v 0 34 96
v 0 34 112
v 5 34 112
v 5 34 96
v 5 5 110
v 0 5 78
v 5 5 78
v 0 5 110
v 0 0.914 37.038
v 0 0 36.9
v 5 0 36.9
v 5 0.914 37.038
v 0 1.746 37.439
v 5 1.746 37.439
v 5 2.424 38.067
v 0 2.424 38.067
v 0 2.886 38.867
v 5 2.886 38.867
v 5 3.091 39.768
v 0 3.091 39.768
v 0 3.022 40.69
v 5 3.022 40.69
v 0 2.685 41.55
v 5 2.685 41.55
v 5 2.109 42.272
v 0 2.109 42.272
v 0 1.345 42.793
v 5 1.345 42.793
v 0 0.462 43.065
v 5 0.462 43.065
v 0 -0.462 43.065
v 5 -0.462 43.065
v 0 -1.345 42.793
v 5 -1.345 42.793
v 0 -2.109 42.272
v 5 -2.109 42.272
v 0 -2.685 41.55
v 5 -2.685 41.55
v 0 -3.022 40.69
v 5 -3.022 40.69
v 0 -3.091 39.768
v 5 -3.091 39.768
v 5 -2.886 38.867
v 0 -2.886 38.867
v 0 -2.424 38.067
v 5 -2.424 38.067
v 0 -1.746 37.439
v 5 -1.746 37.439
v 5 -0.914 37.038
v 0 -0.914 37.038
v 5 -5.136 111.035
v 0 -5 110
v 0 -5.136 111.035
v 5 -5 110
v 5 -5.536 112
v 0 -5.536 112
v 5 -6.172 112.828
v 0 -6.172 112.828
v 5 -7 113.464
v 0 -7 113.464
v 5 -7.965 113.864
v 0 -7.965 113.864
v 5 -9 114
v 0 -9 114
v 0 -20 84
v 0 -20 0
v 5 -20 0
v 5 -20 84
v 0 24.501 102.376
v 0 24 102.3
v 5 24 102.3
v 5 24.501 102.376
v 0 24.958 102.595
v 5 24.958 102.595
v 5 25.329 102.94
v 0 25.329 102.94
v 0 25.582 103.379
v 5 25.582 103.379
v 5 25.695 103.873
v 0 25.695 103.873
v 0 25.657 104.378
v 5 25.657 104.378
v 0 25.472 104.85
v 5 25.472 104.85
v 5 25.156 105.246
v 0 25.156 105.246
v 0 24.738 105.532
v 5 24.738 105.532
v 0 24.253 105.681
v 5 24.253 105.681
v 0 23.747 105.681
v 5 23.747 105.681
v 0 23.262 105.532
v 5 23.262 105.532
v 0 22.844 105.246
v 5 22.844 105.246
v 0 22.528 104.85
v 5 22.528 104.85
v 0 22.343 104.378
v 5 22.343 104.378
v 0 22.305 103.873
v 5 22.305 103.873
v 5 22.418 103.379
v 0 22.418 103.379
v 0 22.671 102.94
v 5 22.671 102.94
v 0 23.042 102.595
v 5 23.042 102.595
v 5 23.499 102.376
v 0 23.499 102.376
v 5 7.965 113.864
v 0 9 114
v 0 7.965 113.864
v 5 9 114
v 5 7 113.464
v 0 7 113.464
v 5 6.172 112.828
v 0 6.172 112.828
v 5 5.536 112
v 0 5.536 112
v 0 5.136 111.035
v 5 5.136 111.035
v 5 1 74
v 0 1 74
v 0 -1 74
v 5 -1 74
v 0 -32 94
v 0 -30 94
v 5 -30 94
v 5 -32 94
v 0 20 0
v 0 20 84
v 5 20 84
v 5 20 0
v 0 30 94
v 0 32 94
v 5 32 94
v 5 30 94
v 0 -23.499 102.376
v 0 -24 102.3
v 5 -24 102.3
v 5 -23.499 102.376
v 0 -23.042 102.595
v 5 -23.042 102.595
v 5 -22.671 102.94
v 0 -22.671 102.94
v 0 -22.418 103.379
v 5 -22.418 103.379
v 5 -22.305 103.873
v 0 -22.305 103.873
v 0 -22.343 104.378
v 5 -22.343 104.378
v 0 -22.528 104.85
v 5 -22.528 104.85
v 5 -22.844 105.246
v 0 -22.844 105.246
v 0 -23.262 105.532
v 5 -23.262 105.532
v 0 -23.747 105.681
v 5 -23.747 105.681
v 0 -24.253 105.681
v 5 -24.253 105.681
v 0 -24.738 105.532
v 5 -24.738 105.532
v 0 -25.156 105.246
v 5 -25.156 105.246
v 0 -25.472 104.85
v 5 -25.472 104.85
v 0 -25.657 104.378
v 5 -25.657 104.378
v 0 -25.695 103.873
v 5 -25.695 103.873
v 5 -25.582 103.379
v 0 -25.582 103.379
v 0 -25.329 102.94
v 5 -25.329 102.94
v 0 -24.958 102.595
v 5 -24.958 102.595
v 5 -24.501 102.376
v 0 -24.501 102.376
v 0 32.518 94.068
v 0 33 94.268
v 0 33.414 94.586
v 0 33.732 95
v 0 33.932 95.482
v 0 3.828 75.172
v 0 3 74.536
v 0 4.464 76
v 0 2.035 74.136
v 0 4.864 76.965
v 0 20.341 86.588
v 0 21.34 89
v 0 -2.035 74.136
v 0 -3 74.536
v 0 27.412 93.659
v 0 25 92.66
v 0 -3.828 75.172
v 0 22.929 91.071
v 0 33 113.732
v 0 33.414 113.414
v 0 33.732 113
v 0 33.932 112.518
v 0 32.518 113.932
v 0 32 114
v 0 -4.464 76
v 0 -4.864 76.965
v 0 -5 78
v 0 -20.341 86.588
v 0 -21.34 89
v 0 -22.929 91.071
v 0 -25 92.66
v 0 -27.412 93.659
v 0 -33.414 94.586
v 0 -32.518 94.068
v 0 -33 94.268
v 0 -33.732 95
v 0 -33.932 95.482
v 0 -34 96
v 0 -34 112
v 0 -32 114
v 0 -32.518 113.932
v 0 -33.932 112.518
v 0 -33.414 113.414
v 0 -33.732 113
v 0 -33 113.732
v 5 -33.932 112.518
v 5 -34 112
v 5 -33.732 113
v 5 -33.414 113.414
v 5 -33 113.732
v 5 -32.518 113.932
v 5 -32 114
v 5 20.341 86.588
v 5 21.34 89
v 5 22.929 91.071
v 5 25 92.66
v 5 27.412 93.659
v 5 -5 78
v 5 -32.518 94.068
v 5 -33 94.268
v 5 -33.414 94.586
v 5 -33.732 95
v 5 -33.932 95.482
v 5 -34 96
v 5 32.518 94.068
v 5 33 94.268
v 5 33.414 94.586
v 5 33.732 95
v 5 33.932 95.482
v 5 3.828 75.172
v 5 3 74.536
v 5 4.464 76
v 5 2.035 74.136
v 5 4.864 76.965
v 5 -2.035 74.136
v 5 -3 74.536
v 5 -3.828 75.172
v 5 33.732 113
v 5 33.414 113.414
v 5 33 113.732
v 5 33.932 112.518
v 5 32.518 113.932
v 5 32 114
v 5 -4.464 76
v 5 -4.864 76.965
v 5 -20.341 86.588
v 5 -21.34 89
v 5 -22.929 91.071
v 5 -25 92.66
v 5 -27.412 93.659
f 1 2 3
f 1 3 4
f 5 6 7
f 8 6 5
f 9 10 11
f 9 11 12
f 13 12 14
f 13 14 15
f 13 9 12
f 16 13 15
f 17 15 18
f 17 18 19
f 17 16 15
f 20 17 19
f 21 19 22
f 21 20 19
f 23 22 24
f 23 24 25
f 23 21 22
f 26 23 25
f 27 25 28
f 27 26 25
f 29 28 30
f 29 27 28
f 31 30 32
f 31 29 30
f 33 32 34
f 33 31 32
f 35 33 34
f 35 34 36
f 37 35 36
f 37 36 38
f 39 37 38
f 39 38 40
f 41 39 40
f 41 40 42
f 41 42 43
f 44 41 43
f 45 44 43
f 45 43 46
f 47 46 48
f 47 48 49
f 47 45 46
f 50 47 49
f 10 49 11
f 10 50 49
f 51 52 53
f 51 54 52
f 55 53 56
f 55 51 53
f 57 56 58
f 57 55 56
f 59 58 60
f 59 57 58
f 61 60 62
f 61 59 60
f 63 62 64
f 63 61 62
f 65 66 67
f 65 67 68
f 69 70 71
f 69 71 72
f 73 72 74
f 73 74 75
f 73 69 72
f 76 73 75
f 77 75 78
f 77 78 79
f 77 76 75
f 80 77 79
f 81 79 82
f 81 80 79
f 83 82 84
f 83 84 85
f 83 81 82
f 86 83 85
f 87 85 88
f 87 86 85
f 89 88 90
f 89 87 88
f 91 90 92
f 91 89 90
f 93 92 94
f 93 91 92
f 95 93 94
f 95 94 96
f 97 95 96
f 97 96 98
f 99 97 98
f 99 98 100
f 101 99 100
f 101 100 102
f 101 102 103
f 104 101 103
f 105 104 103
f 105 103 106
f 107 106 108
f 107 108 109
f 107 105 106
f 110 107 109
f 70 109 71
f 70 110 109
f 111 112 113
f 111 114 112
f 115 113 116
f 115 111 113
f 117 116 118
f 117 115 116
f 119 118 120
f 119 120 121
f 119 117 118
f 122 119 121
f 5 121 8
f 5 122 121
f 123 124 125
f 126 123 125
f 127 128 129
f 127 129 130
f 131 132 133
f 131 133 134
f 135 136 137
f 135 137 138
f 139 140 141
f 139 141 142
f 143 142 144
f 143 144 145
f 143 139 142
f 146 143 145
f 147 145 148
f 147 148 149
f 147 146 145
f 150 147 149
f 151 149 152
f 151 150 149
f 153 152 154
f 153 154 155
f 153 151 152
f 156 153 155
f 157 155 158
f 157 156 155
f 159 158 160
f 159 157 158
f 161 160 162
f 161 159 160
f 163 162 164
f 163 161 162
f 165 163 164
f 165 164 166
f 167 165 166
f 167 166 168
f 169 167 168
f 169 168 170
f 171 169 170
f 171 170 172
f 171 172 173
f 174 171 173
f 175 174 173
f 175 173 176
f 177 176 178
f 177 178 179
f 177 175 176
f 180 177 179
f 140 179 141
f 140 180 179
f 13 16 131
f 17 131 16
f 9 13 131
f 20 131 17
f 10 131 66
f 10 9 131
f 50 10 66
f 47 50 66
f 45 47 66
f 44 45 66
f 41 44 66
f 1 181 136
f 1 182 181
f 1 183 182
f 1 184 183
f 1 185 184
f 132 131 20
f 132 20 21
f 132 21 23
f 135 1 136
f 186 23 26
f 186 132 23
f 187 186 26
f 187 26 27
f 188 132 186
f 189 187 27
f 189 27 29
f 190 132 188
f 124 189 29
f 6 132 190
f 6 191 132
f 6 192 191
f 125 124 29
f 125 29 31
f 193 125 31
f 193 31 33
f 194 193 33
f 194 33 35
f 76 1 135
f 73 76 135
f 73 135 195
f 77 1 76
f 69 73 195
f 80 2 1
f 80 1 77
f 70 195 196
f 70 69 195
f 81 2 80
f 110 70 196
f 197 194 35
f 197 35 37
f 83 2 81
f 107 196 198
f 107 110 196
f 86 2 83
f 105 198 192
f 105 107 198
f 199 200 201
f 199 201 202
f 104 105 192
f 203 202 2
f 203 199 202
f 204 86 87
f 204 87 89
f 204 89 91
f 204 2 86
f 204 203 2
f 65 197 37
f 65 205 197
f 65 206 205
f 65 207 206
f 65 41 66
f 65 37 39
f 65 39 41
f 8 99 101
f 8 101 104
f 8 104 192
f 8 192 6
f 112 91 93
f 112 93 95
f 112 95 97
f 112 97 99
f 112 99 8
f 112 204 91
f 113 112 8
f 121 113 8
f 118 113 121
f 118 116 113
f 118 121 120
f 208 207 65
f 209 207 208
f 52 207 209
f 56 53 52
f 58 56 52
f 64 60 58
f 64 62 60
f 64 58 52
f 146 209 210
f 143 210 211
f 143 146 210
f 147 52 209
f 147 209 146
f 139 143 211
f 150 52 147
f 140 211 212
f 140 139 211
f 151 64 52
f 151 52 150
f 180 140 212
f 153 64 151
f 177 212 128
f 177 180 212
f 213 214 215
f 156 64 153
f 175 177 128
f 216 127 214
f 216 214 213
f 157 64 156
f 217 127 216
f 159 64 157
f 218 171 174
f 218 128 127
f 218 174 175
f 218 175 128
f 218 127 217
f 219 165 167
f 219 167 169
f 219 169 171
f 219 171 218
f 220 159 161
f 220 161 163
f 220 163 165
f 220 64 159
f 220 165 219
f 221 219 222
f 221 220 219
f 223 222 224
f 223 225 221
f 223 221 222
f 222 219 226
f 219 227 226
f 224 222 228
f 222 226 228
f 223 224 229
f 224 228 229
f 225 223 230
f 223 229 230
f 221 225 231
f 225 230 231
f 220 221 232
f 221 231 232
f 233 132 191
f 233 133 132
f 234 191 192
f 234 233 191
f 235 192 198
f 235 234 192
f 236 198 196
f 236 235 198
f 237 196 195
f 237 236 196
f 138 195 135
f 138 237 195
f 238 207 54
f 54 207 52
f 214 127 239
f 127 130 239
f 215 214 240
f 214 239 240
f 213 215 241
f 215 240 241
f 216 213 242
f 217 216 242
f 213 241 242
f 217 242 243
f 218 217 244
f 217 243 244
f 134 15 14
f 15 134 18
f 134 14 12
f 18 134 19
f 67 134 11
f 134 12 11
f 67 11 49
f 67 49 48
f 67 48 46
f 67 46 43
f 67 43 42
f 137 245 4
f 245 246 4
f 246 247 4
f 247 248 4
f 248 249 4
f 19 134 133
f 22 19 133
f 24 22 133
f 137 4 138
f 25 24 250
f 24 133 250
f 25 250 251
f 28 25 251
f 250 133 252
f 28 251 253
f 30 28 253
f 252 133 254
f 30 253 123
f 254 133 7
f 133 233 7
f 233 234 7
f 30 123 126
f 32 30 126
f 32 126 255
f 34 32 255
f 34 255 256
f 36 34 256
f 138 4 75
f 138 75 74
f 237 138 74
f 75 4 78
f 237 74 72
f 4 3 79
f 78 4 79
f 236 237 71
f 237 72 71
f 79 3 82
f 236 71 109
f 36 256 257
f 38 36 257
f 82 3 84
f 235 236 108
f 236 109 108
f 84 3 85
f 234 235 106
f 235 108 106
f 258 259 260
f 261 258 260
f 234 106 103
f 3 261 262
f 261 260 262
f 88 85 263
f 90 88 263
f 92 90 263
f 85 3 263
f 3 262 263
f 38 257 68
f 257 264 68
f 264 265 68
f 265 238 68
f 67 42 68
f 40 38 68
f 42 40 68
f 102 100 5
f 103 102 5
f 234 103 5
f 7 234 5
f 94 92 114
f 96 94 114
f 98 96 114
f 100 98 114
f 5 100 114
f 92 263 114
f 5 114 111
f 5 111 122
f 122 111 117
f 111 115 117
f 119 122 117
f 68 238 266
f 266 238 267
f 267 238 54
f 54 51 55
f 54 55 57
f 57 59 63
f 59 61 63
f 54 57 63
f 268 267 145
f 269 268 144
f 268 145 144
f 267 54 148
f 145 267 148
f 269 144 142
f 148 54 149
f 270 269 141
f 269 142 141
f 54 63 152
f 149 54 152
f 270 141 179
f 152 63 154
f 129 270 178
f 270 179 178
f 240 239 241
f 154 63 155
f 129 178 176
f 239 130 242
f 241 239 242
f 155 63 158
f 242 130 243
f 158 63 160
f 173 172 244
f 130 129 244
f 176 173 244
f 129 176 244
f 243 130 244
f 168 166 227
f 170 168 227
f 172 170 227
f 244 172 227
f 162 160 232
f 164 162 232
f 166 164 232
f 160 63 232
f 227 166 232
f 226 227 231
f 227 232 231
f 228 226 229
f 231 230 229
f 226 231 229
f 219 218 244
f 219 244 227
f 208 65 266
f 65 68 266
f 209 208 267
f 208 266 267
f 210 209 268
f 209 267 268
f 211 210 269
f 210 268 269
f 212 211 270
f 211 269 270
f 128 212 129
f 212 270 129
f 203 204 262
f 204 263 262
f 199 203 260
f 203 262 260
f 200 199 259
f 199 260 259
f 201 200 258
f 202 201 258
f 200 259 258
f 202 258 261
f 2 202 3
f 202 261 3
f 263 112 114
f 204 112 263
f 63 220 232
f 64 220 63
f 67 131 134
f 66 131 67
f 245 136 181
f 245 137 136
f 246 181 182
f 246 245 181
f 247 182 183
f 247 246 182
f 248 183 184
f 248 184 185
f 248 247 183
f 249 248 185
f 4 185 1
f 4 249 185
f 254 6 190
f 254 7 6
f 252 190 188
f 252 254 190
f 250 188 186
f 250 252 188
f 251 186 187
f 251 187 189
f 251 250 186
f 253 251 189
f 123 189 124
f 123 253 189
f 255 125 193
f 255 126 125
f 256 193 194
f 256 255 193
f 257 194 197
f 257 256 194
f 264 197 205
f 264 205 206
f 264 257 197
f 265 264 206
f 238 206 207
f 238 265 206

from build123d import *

# Parameters (mm, degrees)
SKETCH2_R           = 3.1
SKETCH2_R_2         = 1.7
BOSS_EXTRUDE1_DEPTH = 5
FILLET1_R           = 10
FILLET2_R           = 2
SKETCH3_W           = 10
SKETCH3_H           = 40
CUT_EXTRUDE1_DEPTH  = 5
FILLET3_R           = 4


with BuildPart() as part:
    # Sketch2 → Boss-Extrude1 (new body)
    with BuildSketch(Plane.YZ):
        Polygon((-20, 0), (-20, 94), (-34, 94), (-34, 114), (34, 114), (34, 94), (20, 94), (20, 0), align=None)
        with Locations(Location((0, 40, 0), (0, 0, 270))):
            Circle(SKETCH2_R, mode=Mode.SUBTRACT)
        with Locations(Location((-24, 104, 0), (0, 0, 270))):
            Circle(SKETCH2_R_2, mode=Mode.SUBTRACT)
        with Locations(Location((24, 104, 0), (0, 0, 270))):
            Circle(SKETCH2_R_2, mode=Mode.SUBTRACT)
    extrude(amount=BOSS_EXTRUDE1_DEPTH)

    # Fillet1
    fillet1_edges = [part.edges().sort_by_distance(p)[0] for p in [
        (2.5, -20, 94),
        (2.5, 20, 94),
    ]]
    fillet(fillet1_edges, radius=FILLET1_R)

    # Fillet2
    fillet2_edges = [part.edges().sort_by_distance(p)[0] for p in [
        (2.5, -34, 94),
        (2.5, -34, 114),
        (2.5, 34, 114),
        (2.5, 34, 94),
    ]]
    fillet(fillet2_edges, radius=FILLET2_R)

    # Sketch3 → Cut-Extrude1 (cut)
    with BuildSketch(Plane(origin=(0, 0, 0), x_dir=(0, -1, 0), z_dir=(-1, 0, 0))):
        with Locations((0, 94)):
            Rectangle(SKETCH3_W, SKETCH3_H)
    extrude(amount=-CUT_EXTRUDE1_DEPTH, mode=Mode.SUBTRACT)

    # Fillet3
    fillet3_edges = [part.edges().sort_by_distance(p)[0] for p in [
        (2.5, 5, 74),
        (2.5, 5, 114),
        (2.5, -5, 114),
        (2.5, -5, 74),
    ]]
    fillet(fillet3_edges, radius=FILLET3_R)


solid = part.part
